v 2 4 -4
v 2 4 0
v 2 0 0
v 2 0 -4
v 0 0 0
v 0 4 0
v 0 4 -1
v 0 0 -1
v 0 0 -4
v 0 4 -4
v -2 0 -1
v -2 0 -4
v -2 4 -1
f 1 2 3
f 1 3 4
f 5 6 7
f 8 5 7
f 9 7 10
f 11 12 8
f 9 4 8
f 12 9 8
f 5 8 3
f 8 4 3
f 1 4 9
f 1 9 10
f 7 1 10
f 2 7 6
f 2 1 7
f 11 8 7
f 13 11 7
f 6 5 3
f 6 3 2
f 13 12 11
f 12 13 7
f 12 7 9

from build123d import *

# Parameters (mm, degrees)
SKETCH1_W           = 4
SKETCH1_H           = 4
BOSS_EXTRUDE1_DEPTH = 2
SKETCH2_W           = 3
SKETCH2_H           = 4
BOSS_EXTRUDE2_DEPTH = 2
CUT_EXTRUDE1_DEPTH  = 2


with BuildPart() as part:
    # Sketch1 → Boss-Extrude1 (new body)
    with BuildSketch(Plane(origin=(0, 0, 0), x_dir=(0, 0, -1), z_dir=(1, 0, 0))):
        with Locations((2, 2)):
            Rectangle(SKETCH1_W, SKETCH1_H)
    extrude(amount=BOSS_EXTRUDE1_DEPTH)

    # Sketch2 → Boss-Extrude2 (add)
    with BuildSketch(Plane.ZY):
        with Locations((-2.5, 2)):
            Rectangle(SKETCH2_W, SKETCH2_H)
    extrude(amount=BOSS_EXTRUDE2_DEPTH)

    # Sketch3 → Cut-Extrude1 (cut)
    with BuildSketch(Plane.ZY.offset(2)):
        Polygon((-1, 4), (-4, 0), (-4, 4), align=None)
    extrude(amount=-CUT_EXTRUDE1_DEPTH, mode=Mode.SUBTRACT)


solid = part.part
